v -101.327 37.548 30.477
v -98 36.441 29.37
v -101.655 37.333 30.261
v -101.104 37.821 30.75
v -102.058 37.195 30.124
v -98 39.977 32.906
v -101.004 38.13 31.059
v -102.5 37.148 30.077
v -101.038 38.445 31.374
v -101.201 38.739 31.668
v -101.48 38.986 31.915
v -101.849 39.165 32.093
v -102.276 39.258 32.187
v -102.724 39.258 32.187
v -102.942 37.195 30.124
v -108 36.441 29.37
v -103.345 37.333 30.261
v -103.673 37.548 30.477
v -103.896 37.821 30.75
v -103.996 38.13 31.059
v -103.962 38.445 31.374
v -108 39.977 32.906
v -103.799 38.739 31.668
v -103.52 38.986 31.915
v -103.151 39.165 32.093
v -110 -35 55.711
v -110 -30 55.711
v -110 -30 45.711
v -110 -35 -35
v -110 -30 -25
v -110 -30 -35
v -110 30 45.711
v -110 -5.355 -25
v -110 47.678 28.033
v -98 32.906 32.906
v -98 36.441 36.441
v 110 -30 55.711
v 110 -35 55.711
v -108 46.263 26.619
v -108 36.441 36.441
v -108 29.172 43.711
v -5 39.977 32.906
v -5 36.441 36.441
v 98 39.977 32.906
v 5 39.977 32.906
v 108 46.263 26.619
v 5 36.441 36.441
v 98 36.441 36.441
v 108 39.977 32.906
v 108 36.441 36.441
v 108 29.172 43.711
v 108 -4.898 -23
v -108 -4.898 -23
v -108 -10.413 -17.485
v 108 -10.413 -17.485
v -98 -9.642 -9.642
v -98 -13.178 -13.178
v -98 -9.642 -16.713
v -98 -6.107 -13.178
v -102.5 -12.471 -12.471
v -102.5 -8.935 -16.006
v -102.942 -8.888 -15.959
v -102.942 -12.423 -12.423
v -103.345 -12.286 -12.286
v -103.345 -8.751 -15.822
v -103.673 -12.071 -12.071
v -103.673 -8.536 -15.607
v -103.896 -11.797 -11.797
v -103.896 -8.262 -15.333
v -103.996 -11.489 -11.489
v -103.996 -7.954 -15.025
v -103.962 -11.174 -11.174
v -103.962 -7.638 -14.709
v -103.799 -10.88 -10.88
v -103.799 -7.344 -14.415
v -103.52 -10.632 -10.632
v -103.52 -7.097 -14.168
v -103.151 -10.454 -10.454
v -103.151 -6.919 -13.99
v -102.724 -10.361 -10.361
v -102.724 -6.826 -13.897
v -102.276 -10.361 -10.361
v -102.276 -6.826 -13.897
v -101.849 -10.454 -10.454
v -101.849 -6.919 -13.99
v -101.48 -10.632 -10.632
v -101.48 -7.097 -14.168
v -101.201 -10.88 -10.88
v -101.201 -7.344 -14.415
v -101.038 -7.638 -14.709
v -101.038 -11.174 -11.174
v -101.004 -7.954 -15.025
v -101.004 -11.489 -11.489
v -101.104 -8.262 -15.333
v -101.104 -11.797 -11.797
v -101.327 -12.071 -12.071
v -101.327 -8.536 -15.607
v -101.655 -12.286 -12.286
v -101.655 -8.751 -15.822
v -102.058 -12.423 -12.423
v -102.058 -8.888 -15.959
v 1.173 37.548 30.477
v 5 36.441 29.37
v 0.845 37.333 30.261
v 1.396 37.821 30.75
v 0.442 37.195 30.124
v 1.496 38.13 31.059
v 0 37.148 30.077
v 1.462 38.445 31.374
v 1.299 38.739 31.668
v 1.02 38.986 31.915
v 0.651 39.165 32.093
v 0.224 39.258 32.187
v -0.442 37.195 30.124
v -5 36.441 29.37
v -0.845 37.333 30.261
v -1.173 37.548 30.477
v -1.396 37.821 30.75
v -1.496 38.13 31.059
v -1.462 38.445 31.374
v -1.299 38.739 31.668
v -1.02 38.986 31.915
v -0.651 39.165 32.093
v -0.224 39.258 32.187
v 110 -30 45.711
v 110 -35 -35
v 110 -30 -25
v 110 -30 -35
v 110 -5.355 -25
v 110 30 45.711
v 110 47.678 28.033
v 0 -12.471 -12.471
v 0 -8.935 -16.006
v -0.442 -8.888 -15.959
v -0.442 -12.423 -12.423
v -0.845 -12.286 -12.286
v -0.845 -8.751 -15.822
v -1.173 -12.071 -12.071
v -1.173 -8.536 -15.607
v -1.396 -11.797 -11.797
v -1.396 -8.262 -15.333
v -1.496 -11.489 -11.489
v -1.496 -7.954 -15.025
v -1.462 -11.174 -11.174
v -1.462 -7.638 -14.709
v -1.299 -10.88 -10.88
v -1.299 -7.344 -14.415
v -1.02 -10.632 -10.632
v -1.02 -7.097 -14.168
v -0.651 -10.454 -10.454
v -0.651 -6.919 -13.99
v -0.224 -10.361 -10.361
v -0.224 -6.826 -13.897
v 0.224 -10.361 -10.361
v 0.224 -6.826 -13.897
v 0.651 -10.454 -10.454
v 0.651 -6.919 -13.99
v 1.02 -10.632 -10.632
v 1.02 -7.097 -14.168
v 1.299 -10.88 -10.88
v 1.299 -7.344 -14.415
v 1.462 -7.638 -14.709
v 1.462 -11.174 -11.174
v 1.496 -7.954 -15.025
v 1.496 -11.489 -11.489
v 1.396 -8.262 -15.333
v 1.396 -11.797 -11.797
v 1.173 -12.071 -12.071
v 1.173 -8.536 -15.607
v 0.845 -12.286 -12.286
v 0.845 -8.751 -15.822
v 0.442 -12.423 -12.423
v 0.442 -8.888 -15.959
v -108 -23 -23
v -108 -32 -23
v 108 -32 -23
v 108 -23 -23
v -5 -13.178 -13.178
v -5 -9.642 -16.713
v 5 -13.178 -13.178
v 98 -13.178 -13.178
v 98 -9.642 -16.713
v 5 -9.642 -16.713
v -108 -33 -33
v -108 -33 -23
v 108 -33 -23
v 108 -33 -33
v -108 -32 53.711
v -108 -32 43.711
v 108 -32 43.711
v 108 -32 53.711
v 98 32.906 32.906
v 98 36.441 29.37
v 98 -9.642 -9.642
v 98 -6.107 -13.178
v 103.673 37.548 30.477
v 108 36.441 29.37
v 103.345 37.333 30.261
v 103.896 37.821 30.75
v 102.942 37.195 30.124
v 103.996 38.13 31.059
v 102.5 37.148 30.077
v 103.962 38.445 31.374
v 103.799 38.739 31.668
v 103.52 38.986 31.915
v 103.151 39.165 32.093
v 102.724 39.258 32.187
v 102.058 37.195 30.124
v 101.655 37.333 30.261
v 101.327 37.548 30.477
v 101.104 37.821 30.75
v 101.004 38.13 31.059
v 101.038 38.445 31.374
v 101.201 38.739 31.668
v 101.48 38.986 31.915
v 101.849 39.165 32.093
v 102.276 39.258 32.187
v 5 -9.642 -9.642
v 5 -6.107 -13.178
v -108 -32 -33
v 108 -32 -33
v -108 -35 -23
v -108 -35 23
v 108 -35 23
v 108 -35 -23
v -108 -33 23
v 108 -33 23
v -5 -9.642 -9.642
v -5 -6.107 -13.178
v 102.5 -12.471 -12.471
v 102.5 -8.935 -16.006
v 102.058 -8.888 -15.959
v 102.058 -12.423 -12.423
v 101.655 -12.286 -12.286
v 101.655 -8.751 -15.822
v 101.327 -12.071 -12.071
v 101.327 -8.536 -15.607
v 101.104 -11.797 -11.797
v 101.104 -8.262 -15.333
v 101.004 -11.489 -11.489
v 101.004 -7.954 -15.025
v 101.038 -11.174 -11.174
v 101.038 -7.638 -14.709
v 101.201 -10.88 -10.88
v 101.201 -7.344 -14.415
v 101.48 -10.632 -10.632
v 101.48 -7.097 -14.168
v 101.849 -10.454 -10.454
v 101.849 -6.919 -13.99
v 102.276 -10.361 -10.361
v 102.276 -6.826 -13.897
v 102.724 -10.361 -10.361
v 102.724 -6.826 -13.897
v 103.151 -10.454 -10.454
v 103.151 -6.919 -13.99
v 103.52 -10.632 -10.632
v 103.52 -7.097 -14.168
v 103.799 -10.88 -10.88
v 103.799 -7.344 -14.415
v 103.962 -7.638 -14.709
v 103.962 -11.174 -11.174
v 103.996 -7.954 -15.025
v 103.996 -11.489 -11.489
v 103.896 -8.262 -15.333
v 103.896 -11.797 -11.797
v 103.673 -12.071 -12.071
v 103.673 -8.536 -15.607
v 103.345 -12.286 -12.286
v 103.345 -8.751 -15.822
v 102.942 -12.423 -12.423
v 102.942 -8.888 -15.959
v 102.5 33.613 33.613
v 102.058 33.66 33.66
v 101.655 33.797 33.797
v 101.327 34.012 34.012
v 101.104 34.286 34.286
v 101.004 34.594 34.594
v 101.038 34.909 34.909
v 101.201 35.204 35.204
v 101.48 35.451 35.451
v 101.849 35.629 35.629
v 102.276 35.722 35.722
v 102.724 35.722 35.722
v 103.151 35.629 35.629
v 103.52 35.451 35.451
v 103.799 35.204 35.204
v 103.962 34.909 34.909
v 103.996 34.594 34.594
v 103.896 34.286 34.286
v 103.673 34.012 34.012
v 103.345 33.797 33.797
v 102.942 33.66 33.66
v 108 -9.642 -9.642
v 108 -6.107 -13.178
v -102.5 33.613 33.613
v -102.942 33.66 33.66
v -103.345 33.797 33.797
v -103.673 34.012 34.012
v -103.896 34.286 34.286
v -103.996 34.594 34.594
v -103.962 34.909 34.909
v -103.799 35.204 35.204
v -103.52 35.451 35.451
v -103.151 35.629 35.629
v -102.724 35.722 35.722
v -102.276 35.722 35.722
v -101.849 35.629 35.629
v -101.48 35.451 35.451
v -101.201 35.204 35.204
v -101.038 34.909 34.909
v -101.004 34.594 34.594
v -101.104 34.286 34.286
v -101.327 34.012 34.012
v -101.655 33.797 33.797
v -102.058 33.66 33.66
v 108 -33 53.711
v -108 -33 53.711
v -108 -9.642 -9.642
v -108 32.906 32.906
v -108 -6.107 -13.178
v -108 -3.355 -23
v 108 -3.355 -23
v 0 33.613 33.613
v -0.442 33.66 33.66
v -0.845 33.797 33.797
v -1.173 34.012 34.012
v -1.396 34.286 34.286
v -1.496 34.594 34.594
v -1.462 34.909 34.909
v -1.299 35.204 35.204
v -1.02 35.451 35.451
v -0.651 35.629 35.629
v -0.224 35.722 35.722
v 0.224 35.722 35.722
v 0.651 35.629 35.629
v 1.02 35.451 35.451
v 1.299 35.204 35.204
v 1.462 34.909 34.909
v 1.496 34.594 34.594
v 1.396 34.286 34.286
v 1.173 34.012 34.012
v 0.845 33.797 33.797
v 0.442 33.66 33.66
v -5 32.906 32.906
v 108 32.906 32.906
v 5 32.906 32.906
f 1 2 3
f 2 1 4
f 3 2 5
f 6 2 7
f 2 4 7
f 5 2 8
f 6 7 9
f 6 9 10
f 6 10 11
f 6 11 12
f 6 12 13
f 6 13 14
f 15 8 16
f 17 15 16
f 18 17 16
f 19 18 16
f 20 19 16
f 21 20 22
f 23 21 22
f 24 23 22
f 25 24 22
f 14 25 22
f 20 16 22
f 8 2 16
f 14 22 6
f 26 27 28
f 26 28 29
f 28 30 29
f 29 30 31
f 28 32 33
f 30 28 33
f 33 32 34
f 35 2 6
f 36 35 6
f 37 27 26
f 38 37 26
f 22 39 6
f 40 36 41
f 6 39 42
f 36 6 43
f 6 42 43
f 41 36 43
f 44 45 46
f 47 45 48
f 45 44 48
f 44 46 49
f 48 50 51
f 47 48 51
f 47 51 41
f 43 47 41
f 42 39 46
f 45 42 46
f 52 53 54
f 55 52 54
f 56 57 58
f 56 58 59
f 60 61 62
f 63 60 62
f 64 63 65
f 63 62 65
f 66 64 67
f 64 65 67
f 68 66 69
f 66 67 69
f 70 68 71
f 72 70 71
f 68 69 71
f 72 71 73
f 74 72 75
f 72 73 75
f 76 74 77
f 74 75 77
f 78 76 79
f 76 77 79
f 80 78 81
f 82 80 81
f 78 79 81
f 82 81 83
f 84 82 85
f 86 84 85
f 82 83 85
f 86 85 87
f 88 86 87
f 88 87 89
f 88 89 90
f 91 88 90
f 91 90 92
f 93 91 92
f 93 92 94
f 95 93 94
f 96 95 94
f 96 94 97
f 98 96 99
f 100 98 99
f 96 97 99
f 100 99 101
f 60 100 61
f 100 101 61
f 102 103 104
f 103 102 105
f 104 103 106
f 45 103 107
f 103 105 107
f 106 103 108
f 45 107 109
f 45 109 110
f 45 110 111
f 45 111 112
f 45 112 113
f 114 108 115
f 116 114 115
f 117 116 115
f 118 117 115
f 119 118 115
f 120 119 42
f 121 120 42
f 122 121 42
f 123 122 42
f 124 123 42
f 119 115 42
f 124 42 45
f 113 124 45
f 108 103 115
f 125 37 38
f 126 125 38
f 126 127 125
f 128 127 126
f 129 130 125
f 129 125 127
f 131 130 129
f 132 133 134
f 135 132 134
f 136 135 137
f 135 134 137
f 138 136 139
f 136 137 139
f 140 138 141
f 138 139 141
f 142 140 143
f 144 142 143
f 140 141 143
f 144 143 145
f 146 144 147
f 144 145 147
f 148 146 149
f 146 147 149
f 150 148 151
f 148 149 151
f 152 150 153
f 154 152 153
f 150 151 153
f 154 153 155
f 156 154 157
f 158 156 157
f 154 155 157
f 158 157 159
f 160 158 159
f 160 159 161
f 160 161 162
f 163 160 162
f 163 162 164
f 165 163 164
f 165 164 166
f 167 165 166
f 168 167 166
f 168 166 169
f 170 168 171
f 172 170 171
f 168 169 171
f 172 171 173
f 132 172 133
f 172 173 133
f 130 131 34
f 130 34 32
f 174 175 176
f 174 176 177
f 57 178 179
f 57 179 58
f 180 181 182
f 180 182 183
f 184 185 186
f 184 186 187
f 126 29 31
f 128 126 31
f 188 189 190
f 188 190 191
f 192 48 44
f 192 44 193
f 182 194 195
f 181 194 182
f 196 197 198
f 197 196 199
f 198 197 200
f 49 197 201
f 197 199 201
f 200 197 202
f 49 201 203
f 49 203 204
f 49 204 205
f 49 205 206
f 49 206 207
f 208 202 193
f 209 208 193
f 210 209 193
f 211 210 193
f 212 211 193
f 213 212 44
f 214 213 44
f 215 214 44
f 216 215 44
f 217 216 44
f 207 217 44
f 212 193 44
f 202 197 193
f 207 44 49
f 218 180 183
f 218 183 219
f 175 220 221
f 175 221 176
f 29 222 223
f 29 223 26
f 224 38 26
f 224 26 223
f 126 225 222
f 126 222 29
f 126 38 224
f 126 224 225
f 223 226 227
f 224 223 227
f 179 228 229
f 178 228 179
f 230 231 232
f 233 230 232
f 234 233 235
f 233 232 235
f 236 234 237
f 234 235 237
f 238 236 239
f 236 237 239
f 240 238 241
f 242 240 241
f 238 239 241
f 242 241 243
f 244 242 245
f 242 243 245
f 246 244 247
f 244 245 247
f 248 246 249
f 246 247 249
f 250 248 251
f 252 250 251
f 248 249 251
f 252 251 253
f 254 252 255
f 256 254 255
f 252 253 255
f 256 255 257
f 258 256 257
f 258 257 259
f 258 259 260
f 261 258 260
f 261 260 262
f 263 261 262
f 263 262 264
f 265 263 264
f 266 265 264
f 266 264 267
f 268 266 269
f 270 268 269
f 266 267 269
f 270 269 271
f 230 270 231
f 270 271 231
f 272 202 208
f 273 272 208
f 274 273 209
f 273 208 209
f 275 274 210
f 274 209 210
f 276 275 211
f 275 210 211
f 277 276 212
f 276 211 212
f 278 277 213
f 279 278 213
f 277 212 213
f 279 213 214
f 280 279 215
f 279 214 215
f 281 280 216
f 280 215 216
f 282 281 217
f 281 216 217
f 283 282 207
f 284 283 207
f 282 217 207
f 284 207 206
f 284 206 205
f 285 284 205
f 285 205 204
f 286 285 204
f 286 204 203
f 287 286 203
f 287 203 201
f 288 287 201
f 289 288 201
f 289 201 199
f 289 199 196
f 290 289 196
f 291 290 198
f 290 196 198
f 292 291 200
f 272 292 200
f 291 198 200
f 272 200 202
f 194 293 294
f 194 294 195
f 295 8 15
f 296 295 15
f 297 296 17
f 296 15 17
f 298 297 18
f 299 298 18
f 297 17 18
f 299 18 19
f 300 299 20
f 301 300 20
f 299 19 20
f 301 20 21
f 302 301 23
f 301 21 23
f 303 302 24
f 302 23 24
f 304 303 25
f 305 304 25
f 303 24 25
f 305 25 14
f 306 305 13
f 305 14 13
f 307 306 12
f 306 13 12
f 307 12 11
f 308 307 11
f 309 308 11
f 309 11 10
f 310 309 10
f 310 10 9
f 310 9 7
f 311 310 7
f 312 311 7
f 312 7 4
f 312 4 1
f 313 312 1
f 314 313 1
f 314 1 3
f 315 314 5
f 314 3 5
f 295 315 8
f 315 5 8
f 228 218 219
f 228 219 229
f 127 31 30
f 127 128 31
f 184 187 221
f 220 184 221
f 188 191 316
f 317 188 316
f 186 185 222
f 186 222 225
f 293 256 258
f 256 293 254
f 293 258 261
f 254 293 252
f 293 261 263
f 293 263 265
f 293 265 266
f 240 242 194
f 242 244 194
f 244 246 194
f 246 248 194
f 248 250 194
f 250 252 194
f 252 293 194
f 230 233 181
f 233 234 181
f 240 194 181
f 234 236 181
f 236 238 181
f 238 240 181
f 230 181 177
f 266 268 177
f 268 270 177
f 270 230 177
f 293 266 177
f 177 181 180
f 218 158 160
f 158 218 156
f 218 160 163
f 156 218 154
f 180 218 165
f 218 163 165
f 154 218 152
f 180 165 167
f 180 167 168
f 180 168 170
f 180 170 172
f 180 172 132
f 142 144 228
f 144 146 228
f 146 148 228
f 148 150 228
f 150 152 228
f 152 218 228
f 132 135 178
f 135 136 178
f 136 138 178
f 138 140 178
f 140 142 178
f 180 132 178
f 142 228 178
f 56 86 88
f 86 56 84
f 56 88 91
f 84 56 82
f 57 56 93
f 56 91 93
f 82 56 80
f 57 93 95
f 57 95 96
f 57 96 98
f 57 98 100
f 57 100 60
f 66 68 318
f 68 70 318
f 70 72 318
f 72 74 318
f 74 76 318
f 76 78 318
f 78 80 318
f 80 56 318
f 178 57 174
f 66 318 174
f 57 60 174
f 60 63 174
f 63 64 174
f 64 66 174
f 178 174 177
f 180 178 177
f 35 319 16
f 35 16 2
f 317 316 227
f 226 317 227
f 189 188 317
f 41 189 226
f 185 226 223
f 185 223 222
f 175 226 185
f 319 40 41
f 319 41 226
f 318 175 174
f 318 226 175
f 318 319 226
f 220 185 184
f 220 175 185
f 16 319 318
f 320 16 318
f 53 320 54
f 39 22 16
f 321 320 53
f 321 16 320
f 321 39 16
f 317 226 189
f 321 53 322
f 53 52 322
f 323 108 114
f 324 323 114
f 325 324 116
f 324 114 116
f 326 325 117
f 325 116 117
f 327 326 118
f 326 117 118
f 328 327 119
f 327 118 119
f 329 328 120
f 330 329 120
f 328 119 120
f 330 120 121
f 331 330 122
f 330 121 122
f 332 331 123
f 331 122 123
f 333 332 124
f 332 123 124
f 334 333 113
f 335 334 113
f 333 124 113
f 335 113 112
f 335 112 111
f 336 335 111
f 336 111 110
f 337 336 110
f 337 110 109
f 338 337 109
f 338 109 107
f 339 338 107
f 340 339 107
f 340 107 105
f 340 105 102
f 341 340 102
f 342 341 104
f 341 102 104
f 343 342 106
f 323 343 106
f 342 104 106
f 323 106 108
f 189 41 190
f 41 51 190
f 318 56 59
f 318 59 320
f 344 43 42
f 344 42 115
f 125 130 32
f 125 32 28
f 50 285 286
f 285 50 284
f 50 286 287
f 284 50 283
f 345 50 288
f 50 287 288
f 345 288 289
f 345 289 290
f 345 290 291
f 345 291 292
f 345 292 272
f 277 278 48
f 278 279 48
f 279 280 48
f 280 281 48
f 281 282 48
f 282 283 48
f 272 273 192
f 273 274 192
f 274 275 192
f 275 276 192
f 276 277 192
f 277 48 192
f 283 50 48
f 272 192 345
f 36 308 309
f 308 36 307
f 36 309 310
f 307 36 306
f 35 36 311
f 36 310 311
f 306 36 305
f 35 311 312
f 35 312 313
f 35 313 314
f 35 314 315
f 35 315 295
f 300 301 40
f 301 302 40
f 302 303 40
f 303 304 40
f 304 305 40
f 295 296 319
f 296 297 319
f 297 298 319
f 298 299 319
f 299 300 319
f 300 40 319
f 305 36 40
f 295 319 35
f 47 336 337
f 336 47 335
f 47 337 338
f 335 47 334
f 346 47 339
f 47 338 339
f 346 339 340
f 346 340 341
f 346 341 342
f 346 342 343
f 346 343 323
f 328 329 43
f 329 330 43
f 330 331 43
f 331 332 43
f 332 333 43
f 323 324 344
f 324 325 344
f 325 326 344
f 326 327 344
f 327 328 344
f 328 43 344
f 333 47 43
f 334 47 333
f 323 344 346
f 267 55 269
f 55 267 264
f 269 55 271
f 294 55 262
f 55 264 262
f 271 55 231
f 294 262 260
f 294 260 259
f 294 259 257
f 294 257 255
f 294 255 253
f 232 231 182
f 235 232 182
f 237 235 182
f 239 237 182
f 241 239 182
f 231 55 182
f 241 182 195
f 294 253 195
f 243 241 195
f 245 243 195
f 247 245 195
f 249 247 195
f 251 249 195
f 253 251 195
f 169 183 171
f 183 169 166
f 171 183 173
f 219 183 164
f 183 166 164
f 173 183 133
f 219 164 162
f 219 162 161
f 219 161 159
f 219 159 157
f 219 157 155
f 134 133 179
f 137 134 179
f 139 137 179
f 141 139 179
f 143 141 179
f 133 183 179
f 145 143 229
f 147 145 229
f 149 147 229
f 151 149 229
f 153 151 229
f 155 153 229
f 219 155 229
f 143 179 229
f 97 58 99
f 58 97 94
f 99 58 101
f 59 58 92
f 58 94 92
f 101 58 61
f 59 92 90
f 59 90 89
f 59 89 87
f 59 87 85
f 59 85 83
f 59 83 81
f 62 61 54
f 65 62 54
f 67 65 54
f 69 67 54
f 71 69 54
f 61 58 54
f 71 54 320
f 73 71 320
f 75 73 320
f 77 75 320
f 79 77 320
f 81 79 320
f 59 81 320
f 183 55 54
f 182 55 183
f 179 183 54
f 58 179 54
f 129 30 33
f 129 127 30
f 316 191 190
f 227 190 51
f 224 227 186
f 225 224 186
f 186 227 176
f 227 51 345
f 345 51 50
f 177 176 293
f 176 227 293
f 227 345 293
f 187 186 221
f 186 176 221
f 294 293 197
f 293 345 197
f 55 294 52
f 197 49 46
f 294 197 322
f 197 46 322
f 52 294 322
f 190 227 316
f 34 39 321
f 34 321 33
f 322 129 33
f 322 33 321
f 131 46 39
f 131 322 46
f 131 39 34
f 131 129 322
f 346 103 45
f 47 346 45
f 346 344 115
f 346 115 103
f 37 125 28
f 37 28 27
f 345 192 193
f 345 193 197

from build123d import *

# Parameters (mm, degrees)
BOSS_EXTRUDE1_DEPTH = 110
SHELL1_T            = -2
SKETCH3_W           = 216
SKETCH3_H           = 46
CUT_EXTRUDE1_DEPTH  = 10
BOSS_EXTRUDE2_REACH = 232.002
SKETCH6_R           = 1.5
CUT_EXTRUDE2_DEPTH  = 5


with BuildPart() as part:
    # Sketch2 → Boss-Extrude1 (new, symmetric)
    with BuildSketch(Plane(origin=(0, 0, 0), x_dir=(0, 0, -1), z_dir=(1, 0, 0))):
        Polygon((25, -30), (25, -5.355339059), (-28.033008589, 47.67766953), (-45.710678119, 30), (-45.710678119, -30), (-55.710678119, -30), (-55.710678119, -35), (-45.710678119, -35), (25, -35), (35, -35), (35, -30), align=None)
    extrude(amount=BOSS_EXTRUDE1_DEPTH, both=True)

    # Shell1
    shell1_openings = [part.faces().sort_by_distance(p)[0] for p in [
        (0, 21.161165235, 1.516504294),
    ]]
    offset(amount=SHELL1_T, openings=shell1_openings, kind=Kind.INTERSECTION)

    # Sketch3 → Cut-Extrude1 (cut)
    with BuildSketch(Plane(origin=(0, -33, 0), x_dir=(1, 0, 0), z_dir=(0, 1, 0))):
        Rectangle(SKETCH3_W, SKETCH3_H)
    extrude(amount=-CUT_EXTRUDE1_DEPTH, mode=Mode.SUBTRACT)

    # Sketch5 → Boss-Extrude2 (add, up to next)
    with BuildSketch(Plane(origin=(-108, 0, 0), x_dir=(0, 0, -1), z_dir=(1, 0, 0)), mode=Mode.PRIVATE) as boss_extrude2_sk1:
        Polygon((-36.441125497, 36.441125497), (23, -23), (23, -4.898066402), (17.484567107, -10.413499295), (-32.905591591, 39.976659403), align=None)
    boss_extrude2_tool1 = extrude(boss_extrude2_sk1.sketch, amount=BOSS_EXTRUDE2_REACH, mode=Mode.PRIVATE) - part.part
    add(boss_extrude2_tool1.solids().sort_by_distance((-108, 7.973571, 3.970996))[0])

    # Sketch6 → Cut-Extrude2 (cut, symmetric)
    with BuildSketch(Plane(origin=(0, 3.535533906, -3.535533906), x_dir=(1, 0, 0), z_dir=(0, 0.7071067811865476, -0.7071067811865475))):
        Polygon((-98, 13.636038969), (-108, 13.636038969), (-108, -46.535533906), (-98, -46.535533906), (-98, -51.535533906), (-5, -51.535533906), (-5, -46.535533906), (5, -46.535533906), (5, -51.535533906), (98, -51.535533906), (98, -46.535533906), (108, -46.535533906), (108, 13.636038969), (98, 13.636038969), (98, 18.636038969), (5, 18.636038969), (5, 13.636038969), (-5, 13.636038969), (-5, 18.636038969), (-98, 18.636038969), align=None)
        with Locations(Location((0, 16.136038969, 0), (0, 0, 90))):
            Circle(SKETCH6_R)
        with Locations(Location((-102.5, 16.136038969, 0), (0, 0, 90))):
            Circle(SKETCH6_R)
        with Locations(Location((102.5, 16.136038969, 0), (0, 0, 90))):
            Circle(SKETCH6_R)
        with Locations(Location((102.5, -49.035533906, 0), (0, 0, 90))):
            Circle(SKETCH6_R)
        with Locations(Location((0, -49.035533906, 0), (0, 0, 90))):
            Circle(SKETCH6_R)
        with Locations(Location((-102.5, -49.035533906, 0), (0, 0, 90))):
            Circle(SKETCH6_R)
    extrude(amount=CUT_EXTRUDE2_DEPTH, both=True, mode=Mode.SUBTRACT)


solid = part.part
